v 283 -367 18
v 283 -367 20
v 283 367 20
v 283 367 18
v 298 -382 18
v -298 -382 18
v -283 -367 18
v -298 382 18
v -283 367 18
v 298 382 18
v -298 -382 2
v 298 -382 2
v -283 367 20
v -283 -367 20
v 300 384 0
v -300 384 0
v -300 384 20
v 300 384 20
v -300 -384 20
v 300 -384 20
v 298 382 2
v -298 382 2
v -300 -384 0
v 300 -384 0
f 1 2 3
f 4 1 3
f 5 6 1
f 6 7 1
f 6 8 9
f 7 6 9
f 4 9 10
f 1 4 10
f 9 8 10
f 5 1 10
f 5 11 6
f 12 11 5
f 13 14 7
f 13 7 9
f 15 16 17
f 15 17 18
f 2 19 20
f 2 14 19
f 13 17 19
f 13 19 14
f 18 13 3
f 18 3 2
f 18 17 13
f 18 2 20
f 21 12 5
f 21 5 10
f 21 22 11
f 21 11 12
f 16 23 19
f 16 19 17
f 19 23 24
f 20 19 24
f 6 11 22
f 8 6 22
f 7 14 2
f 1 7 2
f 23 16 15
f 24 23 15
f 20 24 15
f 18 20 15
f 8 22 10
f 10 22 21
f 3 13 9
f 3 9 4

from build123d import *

# Parameters (mm, degrees)
SKETCH1_W           = 600
SKETCH1_H           = 768
BOSS_EXTRUDE1_DEPTH = 20
SHELL1_T            = -2
SKETCH2_W           = 596
SKETCH2_H           = 764
SKETCH2_W_2         = 566
SKETCH2_H_2         = 734
BOSS_EXTRUDE2_DEPTH = 2


with BuildPart() as part:
    # Sketch1 → Boss-Extrude1 (new body)
    with BuildSketch(Plane.XY):
        Rectangle(SKETCH1_W, SKETCH1_H)
    extrude(amount=BOSS_EXTRUDE1_DEPTH)

    # Shell1
    shell1_openings = [part.faces().sort_by_distance(p)[0] for p in [
        (0, 0, 20),
    ]]
    offset(amount=SHELL1_T, openings=shell1_openings, kind=Kind.INTERSECTION)

    # Sketch2 → Boss-Extrude2 (add)
    with BuildSketch(Plane.XY.offset(20)):
        Rectangle(SKETCH2_W, SKETCH2_H)
        Rectangle(SKETCH2_W_2, SKETCH2_H_2, mode=Mode.SUBTRACT)
    extrude(amount=-BOSS_EXTRUDE2_DEPTH)


solid = part.part
